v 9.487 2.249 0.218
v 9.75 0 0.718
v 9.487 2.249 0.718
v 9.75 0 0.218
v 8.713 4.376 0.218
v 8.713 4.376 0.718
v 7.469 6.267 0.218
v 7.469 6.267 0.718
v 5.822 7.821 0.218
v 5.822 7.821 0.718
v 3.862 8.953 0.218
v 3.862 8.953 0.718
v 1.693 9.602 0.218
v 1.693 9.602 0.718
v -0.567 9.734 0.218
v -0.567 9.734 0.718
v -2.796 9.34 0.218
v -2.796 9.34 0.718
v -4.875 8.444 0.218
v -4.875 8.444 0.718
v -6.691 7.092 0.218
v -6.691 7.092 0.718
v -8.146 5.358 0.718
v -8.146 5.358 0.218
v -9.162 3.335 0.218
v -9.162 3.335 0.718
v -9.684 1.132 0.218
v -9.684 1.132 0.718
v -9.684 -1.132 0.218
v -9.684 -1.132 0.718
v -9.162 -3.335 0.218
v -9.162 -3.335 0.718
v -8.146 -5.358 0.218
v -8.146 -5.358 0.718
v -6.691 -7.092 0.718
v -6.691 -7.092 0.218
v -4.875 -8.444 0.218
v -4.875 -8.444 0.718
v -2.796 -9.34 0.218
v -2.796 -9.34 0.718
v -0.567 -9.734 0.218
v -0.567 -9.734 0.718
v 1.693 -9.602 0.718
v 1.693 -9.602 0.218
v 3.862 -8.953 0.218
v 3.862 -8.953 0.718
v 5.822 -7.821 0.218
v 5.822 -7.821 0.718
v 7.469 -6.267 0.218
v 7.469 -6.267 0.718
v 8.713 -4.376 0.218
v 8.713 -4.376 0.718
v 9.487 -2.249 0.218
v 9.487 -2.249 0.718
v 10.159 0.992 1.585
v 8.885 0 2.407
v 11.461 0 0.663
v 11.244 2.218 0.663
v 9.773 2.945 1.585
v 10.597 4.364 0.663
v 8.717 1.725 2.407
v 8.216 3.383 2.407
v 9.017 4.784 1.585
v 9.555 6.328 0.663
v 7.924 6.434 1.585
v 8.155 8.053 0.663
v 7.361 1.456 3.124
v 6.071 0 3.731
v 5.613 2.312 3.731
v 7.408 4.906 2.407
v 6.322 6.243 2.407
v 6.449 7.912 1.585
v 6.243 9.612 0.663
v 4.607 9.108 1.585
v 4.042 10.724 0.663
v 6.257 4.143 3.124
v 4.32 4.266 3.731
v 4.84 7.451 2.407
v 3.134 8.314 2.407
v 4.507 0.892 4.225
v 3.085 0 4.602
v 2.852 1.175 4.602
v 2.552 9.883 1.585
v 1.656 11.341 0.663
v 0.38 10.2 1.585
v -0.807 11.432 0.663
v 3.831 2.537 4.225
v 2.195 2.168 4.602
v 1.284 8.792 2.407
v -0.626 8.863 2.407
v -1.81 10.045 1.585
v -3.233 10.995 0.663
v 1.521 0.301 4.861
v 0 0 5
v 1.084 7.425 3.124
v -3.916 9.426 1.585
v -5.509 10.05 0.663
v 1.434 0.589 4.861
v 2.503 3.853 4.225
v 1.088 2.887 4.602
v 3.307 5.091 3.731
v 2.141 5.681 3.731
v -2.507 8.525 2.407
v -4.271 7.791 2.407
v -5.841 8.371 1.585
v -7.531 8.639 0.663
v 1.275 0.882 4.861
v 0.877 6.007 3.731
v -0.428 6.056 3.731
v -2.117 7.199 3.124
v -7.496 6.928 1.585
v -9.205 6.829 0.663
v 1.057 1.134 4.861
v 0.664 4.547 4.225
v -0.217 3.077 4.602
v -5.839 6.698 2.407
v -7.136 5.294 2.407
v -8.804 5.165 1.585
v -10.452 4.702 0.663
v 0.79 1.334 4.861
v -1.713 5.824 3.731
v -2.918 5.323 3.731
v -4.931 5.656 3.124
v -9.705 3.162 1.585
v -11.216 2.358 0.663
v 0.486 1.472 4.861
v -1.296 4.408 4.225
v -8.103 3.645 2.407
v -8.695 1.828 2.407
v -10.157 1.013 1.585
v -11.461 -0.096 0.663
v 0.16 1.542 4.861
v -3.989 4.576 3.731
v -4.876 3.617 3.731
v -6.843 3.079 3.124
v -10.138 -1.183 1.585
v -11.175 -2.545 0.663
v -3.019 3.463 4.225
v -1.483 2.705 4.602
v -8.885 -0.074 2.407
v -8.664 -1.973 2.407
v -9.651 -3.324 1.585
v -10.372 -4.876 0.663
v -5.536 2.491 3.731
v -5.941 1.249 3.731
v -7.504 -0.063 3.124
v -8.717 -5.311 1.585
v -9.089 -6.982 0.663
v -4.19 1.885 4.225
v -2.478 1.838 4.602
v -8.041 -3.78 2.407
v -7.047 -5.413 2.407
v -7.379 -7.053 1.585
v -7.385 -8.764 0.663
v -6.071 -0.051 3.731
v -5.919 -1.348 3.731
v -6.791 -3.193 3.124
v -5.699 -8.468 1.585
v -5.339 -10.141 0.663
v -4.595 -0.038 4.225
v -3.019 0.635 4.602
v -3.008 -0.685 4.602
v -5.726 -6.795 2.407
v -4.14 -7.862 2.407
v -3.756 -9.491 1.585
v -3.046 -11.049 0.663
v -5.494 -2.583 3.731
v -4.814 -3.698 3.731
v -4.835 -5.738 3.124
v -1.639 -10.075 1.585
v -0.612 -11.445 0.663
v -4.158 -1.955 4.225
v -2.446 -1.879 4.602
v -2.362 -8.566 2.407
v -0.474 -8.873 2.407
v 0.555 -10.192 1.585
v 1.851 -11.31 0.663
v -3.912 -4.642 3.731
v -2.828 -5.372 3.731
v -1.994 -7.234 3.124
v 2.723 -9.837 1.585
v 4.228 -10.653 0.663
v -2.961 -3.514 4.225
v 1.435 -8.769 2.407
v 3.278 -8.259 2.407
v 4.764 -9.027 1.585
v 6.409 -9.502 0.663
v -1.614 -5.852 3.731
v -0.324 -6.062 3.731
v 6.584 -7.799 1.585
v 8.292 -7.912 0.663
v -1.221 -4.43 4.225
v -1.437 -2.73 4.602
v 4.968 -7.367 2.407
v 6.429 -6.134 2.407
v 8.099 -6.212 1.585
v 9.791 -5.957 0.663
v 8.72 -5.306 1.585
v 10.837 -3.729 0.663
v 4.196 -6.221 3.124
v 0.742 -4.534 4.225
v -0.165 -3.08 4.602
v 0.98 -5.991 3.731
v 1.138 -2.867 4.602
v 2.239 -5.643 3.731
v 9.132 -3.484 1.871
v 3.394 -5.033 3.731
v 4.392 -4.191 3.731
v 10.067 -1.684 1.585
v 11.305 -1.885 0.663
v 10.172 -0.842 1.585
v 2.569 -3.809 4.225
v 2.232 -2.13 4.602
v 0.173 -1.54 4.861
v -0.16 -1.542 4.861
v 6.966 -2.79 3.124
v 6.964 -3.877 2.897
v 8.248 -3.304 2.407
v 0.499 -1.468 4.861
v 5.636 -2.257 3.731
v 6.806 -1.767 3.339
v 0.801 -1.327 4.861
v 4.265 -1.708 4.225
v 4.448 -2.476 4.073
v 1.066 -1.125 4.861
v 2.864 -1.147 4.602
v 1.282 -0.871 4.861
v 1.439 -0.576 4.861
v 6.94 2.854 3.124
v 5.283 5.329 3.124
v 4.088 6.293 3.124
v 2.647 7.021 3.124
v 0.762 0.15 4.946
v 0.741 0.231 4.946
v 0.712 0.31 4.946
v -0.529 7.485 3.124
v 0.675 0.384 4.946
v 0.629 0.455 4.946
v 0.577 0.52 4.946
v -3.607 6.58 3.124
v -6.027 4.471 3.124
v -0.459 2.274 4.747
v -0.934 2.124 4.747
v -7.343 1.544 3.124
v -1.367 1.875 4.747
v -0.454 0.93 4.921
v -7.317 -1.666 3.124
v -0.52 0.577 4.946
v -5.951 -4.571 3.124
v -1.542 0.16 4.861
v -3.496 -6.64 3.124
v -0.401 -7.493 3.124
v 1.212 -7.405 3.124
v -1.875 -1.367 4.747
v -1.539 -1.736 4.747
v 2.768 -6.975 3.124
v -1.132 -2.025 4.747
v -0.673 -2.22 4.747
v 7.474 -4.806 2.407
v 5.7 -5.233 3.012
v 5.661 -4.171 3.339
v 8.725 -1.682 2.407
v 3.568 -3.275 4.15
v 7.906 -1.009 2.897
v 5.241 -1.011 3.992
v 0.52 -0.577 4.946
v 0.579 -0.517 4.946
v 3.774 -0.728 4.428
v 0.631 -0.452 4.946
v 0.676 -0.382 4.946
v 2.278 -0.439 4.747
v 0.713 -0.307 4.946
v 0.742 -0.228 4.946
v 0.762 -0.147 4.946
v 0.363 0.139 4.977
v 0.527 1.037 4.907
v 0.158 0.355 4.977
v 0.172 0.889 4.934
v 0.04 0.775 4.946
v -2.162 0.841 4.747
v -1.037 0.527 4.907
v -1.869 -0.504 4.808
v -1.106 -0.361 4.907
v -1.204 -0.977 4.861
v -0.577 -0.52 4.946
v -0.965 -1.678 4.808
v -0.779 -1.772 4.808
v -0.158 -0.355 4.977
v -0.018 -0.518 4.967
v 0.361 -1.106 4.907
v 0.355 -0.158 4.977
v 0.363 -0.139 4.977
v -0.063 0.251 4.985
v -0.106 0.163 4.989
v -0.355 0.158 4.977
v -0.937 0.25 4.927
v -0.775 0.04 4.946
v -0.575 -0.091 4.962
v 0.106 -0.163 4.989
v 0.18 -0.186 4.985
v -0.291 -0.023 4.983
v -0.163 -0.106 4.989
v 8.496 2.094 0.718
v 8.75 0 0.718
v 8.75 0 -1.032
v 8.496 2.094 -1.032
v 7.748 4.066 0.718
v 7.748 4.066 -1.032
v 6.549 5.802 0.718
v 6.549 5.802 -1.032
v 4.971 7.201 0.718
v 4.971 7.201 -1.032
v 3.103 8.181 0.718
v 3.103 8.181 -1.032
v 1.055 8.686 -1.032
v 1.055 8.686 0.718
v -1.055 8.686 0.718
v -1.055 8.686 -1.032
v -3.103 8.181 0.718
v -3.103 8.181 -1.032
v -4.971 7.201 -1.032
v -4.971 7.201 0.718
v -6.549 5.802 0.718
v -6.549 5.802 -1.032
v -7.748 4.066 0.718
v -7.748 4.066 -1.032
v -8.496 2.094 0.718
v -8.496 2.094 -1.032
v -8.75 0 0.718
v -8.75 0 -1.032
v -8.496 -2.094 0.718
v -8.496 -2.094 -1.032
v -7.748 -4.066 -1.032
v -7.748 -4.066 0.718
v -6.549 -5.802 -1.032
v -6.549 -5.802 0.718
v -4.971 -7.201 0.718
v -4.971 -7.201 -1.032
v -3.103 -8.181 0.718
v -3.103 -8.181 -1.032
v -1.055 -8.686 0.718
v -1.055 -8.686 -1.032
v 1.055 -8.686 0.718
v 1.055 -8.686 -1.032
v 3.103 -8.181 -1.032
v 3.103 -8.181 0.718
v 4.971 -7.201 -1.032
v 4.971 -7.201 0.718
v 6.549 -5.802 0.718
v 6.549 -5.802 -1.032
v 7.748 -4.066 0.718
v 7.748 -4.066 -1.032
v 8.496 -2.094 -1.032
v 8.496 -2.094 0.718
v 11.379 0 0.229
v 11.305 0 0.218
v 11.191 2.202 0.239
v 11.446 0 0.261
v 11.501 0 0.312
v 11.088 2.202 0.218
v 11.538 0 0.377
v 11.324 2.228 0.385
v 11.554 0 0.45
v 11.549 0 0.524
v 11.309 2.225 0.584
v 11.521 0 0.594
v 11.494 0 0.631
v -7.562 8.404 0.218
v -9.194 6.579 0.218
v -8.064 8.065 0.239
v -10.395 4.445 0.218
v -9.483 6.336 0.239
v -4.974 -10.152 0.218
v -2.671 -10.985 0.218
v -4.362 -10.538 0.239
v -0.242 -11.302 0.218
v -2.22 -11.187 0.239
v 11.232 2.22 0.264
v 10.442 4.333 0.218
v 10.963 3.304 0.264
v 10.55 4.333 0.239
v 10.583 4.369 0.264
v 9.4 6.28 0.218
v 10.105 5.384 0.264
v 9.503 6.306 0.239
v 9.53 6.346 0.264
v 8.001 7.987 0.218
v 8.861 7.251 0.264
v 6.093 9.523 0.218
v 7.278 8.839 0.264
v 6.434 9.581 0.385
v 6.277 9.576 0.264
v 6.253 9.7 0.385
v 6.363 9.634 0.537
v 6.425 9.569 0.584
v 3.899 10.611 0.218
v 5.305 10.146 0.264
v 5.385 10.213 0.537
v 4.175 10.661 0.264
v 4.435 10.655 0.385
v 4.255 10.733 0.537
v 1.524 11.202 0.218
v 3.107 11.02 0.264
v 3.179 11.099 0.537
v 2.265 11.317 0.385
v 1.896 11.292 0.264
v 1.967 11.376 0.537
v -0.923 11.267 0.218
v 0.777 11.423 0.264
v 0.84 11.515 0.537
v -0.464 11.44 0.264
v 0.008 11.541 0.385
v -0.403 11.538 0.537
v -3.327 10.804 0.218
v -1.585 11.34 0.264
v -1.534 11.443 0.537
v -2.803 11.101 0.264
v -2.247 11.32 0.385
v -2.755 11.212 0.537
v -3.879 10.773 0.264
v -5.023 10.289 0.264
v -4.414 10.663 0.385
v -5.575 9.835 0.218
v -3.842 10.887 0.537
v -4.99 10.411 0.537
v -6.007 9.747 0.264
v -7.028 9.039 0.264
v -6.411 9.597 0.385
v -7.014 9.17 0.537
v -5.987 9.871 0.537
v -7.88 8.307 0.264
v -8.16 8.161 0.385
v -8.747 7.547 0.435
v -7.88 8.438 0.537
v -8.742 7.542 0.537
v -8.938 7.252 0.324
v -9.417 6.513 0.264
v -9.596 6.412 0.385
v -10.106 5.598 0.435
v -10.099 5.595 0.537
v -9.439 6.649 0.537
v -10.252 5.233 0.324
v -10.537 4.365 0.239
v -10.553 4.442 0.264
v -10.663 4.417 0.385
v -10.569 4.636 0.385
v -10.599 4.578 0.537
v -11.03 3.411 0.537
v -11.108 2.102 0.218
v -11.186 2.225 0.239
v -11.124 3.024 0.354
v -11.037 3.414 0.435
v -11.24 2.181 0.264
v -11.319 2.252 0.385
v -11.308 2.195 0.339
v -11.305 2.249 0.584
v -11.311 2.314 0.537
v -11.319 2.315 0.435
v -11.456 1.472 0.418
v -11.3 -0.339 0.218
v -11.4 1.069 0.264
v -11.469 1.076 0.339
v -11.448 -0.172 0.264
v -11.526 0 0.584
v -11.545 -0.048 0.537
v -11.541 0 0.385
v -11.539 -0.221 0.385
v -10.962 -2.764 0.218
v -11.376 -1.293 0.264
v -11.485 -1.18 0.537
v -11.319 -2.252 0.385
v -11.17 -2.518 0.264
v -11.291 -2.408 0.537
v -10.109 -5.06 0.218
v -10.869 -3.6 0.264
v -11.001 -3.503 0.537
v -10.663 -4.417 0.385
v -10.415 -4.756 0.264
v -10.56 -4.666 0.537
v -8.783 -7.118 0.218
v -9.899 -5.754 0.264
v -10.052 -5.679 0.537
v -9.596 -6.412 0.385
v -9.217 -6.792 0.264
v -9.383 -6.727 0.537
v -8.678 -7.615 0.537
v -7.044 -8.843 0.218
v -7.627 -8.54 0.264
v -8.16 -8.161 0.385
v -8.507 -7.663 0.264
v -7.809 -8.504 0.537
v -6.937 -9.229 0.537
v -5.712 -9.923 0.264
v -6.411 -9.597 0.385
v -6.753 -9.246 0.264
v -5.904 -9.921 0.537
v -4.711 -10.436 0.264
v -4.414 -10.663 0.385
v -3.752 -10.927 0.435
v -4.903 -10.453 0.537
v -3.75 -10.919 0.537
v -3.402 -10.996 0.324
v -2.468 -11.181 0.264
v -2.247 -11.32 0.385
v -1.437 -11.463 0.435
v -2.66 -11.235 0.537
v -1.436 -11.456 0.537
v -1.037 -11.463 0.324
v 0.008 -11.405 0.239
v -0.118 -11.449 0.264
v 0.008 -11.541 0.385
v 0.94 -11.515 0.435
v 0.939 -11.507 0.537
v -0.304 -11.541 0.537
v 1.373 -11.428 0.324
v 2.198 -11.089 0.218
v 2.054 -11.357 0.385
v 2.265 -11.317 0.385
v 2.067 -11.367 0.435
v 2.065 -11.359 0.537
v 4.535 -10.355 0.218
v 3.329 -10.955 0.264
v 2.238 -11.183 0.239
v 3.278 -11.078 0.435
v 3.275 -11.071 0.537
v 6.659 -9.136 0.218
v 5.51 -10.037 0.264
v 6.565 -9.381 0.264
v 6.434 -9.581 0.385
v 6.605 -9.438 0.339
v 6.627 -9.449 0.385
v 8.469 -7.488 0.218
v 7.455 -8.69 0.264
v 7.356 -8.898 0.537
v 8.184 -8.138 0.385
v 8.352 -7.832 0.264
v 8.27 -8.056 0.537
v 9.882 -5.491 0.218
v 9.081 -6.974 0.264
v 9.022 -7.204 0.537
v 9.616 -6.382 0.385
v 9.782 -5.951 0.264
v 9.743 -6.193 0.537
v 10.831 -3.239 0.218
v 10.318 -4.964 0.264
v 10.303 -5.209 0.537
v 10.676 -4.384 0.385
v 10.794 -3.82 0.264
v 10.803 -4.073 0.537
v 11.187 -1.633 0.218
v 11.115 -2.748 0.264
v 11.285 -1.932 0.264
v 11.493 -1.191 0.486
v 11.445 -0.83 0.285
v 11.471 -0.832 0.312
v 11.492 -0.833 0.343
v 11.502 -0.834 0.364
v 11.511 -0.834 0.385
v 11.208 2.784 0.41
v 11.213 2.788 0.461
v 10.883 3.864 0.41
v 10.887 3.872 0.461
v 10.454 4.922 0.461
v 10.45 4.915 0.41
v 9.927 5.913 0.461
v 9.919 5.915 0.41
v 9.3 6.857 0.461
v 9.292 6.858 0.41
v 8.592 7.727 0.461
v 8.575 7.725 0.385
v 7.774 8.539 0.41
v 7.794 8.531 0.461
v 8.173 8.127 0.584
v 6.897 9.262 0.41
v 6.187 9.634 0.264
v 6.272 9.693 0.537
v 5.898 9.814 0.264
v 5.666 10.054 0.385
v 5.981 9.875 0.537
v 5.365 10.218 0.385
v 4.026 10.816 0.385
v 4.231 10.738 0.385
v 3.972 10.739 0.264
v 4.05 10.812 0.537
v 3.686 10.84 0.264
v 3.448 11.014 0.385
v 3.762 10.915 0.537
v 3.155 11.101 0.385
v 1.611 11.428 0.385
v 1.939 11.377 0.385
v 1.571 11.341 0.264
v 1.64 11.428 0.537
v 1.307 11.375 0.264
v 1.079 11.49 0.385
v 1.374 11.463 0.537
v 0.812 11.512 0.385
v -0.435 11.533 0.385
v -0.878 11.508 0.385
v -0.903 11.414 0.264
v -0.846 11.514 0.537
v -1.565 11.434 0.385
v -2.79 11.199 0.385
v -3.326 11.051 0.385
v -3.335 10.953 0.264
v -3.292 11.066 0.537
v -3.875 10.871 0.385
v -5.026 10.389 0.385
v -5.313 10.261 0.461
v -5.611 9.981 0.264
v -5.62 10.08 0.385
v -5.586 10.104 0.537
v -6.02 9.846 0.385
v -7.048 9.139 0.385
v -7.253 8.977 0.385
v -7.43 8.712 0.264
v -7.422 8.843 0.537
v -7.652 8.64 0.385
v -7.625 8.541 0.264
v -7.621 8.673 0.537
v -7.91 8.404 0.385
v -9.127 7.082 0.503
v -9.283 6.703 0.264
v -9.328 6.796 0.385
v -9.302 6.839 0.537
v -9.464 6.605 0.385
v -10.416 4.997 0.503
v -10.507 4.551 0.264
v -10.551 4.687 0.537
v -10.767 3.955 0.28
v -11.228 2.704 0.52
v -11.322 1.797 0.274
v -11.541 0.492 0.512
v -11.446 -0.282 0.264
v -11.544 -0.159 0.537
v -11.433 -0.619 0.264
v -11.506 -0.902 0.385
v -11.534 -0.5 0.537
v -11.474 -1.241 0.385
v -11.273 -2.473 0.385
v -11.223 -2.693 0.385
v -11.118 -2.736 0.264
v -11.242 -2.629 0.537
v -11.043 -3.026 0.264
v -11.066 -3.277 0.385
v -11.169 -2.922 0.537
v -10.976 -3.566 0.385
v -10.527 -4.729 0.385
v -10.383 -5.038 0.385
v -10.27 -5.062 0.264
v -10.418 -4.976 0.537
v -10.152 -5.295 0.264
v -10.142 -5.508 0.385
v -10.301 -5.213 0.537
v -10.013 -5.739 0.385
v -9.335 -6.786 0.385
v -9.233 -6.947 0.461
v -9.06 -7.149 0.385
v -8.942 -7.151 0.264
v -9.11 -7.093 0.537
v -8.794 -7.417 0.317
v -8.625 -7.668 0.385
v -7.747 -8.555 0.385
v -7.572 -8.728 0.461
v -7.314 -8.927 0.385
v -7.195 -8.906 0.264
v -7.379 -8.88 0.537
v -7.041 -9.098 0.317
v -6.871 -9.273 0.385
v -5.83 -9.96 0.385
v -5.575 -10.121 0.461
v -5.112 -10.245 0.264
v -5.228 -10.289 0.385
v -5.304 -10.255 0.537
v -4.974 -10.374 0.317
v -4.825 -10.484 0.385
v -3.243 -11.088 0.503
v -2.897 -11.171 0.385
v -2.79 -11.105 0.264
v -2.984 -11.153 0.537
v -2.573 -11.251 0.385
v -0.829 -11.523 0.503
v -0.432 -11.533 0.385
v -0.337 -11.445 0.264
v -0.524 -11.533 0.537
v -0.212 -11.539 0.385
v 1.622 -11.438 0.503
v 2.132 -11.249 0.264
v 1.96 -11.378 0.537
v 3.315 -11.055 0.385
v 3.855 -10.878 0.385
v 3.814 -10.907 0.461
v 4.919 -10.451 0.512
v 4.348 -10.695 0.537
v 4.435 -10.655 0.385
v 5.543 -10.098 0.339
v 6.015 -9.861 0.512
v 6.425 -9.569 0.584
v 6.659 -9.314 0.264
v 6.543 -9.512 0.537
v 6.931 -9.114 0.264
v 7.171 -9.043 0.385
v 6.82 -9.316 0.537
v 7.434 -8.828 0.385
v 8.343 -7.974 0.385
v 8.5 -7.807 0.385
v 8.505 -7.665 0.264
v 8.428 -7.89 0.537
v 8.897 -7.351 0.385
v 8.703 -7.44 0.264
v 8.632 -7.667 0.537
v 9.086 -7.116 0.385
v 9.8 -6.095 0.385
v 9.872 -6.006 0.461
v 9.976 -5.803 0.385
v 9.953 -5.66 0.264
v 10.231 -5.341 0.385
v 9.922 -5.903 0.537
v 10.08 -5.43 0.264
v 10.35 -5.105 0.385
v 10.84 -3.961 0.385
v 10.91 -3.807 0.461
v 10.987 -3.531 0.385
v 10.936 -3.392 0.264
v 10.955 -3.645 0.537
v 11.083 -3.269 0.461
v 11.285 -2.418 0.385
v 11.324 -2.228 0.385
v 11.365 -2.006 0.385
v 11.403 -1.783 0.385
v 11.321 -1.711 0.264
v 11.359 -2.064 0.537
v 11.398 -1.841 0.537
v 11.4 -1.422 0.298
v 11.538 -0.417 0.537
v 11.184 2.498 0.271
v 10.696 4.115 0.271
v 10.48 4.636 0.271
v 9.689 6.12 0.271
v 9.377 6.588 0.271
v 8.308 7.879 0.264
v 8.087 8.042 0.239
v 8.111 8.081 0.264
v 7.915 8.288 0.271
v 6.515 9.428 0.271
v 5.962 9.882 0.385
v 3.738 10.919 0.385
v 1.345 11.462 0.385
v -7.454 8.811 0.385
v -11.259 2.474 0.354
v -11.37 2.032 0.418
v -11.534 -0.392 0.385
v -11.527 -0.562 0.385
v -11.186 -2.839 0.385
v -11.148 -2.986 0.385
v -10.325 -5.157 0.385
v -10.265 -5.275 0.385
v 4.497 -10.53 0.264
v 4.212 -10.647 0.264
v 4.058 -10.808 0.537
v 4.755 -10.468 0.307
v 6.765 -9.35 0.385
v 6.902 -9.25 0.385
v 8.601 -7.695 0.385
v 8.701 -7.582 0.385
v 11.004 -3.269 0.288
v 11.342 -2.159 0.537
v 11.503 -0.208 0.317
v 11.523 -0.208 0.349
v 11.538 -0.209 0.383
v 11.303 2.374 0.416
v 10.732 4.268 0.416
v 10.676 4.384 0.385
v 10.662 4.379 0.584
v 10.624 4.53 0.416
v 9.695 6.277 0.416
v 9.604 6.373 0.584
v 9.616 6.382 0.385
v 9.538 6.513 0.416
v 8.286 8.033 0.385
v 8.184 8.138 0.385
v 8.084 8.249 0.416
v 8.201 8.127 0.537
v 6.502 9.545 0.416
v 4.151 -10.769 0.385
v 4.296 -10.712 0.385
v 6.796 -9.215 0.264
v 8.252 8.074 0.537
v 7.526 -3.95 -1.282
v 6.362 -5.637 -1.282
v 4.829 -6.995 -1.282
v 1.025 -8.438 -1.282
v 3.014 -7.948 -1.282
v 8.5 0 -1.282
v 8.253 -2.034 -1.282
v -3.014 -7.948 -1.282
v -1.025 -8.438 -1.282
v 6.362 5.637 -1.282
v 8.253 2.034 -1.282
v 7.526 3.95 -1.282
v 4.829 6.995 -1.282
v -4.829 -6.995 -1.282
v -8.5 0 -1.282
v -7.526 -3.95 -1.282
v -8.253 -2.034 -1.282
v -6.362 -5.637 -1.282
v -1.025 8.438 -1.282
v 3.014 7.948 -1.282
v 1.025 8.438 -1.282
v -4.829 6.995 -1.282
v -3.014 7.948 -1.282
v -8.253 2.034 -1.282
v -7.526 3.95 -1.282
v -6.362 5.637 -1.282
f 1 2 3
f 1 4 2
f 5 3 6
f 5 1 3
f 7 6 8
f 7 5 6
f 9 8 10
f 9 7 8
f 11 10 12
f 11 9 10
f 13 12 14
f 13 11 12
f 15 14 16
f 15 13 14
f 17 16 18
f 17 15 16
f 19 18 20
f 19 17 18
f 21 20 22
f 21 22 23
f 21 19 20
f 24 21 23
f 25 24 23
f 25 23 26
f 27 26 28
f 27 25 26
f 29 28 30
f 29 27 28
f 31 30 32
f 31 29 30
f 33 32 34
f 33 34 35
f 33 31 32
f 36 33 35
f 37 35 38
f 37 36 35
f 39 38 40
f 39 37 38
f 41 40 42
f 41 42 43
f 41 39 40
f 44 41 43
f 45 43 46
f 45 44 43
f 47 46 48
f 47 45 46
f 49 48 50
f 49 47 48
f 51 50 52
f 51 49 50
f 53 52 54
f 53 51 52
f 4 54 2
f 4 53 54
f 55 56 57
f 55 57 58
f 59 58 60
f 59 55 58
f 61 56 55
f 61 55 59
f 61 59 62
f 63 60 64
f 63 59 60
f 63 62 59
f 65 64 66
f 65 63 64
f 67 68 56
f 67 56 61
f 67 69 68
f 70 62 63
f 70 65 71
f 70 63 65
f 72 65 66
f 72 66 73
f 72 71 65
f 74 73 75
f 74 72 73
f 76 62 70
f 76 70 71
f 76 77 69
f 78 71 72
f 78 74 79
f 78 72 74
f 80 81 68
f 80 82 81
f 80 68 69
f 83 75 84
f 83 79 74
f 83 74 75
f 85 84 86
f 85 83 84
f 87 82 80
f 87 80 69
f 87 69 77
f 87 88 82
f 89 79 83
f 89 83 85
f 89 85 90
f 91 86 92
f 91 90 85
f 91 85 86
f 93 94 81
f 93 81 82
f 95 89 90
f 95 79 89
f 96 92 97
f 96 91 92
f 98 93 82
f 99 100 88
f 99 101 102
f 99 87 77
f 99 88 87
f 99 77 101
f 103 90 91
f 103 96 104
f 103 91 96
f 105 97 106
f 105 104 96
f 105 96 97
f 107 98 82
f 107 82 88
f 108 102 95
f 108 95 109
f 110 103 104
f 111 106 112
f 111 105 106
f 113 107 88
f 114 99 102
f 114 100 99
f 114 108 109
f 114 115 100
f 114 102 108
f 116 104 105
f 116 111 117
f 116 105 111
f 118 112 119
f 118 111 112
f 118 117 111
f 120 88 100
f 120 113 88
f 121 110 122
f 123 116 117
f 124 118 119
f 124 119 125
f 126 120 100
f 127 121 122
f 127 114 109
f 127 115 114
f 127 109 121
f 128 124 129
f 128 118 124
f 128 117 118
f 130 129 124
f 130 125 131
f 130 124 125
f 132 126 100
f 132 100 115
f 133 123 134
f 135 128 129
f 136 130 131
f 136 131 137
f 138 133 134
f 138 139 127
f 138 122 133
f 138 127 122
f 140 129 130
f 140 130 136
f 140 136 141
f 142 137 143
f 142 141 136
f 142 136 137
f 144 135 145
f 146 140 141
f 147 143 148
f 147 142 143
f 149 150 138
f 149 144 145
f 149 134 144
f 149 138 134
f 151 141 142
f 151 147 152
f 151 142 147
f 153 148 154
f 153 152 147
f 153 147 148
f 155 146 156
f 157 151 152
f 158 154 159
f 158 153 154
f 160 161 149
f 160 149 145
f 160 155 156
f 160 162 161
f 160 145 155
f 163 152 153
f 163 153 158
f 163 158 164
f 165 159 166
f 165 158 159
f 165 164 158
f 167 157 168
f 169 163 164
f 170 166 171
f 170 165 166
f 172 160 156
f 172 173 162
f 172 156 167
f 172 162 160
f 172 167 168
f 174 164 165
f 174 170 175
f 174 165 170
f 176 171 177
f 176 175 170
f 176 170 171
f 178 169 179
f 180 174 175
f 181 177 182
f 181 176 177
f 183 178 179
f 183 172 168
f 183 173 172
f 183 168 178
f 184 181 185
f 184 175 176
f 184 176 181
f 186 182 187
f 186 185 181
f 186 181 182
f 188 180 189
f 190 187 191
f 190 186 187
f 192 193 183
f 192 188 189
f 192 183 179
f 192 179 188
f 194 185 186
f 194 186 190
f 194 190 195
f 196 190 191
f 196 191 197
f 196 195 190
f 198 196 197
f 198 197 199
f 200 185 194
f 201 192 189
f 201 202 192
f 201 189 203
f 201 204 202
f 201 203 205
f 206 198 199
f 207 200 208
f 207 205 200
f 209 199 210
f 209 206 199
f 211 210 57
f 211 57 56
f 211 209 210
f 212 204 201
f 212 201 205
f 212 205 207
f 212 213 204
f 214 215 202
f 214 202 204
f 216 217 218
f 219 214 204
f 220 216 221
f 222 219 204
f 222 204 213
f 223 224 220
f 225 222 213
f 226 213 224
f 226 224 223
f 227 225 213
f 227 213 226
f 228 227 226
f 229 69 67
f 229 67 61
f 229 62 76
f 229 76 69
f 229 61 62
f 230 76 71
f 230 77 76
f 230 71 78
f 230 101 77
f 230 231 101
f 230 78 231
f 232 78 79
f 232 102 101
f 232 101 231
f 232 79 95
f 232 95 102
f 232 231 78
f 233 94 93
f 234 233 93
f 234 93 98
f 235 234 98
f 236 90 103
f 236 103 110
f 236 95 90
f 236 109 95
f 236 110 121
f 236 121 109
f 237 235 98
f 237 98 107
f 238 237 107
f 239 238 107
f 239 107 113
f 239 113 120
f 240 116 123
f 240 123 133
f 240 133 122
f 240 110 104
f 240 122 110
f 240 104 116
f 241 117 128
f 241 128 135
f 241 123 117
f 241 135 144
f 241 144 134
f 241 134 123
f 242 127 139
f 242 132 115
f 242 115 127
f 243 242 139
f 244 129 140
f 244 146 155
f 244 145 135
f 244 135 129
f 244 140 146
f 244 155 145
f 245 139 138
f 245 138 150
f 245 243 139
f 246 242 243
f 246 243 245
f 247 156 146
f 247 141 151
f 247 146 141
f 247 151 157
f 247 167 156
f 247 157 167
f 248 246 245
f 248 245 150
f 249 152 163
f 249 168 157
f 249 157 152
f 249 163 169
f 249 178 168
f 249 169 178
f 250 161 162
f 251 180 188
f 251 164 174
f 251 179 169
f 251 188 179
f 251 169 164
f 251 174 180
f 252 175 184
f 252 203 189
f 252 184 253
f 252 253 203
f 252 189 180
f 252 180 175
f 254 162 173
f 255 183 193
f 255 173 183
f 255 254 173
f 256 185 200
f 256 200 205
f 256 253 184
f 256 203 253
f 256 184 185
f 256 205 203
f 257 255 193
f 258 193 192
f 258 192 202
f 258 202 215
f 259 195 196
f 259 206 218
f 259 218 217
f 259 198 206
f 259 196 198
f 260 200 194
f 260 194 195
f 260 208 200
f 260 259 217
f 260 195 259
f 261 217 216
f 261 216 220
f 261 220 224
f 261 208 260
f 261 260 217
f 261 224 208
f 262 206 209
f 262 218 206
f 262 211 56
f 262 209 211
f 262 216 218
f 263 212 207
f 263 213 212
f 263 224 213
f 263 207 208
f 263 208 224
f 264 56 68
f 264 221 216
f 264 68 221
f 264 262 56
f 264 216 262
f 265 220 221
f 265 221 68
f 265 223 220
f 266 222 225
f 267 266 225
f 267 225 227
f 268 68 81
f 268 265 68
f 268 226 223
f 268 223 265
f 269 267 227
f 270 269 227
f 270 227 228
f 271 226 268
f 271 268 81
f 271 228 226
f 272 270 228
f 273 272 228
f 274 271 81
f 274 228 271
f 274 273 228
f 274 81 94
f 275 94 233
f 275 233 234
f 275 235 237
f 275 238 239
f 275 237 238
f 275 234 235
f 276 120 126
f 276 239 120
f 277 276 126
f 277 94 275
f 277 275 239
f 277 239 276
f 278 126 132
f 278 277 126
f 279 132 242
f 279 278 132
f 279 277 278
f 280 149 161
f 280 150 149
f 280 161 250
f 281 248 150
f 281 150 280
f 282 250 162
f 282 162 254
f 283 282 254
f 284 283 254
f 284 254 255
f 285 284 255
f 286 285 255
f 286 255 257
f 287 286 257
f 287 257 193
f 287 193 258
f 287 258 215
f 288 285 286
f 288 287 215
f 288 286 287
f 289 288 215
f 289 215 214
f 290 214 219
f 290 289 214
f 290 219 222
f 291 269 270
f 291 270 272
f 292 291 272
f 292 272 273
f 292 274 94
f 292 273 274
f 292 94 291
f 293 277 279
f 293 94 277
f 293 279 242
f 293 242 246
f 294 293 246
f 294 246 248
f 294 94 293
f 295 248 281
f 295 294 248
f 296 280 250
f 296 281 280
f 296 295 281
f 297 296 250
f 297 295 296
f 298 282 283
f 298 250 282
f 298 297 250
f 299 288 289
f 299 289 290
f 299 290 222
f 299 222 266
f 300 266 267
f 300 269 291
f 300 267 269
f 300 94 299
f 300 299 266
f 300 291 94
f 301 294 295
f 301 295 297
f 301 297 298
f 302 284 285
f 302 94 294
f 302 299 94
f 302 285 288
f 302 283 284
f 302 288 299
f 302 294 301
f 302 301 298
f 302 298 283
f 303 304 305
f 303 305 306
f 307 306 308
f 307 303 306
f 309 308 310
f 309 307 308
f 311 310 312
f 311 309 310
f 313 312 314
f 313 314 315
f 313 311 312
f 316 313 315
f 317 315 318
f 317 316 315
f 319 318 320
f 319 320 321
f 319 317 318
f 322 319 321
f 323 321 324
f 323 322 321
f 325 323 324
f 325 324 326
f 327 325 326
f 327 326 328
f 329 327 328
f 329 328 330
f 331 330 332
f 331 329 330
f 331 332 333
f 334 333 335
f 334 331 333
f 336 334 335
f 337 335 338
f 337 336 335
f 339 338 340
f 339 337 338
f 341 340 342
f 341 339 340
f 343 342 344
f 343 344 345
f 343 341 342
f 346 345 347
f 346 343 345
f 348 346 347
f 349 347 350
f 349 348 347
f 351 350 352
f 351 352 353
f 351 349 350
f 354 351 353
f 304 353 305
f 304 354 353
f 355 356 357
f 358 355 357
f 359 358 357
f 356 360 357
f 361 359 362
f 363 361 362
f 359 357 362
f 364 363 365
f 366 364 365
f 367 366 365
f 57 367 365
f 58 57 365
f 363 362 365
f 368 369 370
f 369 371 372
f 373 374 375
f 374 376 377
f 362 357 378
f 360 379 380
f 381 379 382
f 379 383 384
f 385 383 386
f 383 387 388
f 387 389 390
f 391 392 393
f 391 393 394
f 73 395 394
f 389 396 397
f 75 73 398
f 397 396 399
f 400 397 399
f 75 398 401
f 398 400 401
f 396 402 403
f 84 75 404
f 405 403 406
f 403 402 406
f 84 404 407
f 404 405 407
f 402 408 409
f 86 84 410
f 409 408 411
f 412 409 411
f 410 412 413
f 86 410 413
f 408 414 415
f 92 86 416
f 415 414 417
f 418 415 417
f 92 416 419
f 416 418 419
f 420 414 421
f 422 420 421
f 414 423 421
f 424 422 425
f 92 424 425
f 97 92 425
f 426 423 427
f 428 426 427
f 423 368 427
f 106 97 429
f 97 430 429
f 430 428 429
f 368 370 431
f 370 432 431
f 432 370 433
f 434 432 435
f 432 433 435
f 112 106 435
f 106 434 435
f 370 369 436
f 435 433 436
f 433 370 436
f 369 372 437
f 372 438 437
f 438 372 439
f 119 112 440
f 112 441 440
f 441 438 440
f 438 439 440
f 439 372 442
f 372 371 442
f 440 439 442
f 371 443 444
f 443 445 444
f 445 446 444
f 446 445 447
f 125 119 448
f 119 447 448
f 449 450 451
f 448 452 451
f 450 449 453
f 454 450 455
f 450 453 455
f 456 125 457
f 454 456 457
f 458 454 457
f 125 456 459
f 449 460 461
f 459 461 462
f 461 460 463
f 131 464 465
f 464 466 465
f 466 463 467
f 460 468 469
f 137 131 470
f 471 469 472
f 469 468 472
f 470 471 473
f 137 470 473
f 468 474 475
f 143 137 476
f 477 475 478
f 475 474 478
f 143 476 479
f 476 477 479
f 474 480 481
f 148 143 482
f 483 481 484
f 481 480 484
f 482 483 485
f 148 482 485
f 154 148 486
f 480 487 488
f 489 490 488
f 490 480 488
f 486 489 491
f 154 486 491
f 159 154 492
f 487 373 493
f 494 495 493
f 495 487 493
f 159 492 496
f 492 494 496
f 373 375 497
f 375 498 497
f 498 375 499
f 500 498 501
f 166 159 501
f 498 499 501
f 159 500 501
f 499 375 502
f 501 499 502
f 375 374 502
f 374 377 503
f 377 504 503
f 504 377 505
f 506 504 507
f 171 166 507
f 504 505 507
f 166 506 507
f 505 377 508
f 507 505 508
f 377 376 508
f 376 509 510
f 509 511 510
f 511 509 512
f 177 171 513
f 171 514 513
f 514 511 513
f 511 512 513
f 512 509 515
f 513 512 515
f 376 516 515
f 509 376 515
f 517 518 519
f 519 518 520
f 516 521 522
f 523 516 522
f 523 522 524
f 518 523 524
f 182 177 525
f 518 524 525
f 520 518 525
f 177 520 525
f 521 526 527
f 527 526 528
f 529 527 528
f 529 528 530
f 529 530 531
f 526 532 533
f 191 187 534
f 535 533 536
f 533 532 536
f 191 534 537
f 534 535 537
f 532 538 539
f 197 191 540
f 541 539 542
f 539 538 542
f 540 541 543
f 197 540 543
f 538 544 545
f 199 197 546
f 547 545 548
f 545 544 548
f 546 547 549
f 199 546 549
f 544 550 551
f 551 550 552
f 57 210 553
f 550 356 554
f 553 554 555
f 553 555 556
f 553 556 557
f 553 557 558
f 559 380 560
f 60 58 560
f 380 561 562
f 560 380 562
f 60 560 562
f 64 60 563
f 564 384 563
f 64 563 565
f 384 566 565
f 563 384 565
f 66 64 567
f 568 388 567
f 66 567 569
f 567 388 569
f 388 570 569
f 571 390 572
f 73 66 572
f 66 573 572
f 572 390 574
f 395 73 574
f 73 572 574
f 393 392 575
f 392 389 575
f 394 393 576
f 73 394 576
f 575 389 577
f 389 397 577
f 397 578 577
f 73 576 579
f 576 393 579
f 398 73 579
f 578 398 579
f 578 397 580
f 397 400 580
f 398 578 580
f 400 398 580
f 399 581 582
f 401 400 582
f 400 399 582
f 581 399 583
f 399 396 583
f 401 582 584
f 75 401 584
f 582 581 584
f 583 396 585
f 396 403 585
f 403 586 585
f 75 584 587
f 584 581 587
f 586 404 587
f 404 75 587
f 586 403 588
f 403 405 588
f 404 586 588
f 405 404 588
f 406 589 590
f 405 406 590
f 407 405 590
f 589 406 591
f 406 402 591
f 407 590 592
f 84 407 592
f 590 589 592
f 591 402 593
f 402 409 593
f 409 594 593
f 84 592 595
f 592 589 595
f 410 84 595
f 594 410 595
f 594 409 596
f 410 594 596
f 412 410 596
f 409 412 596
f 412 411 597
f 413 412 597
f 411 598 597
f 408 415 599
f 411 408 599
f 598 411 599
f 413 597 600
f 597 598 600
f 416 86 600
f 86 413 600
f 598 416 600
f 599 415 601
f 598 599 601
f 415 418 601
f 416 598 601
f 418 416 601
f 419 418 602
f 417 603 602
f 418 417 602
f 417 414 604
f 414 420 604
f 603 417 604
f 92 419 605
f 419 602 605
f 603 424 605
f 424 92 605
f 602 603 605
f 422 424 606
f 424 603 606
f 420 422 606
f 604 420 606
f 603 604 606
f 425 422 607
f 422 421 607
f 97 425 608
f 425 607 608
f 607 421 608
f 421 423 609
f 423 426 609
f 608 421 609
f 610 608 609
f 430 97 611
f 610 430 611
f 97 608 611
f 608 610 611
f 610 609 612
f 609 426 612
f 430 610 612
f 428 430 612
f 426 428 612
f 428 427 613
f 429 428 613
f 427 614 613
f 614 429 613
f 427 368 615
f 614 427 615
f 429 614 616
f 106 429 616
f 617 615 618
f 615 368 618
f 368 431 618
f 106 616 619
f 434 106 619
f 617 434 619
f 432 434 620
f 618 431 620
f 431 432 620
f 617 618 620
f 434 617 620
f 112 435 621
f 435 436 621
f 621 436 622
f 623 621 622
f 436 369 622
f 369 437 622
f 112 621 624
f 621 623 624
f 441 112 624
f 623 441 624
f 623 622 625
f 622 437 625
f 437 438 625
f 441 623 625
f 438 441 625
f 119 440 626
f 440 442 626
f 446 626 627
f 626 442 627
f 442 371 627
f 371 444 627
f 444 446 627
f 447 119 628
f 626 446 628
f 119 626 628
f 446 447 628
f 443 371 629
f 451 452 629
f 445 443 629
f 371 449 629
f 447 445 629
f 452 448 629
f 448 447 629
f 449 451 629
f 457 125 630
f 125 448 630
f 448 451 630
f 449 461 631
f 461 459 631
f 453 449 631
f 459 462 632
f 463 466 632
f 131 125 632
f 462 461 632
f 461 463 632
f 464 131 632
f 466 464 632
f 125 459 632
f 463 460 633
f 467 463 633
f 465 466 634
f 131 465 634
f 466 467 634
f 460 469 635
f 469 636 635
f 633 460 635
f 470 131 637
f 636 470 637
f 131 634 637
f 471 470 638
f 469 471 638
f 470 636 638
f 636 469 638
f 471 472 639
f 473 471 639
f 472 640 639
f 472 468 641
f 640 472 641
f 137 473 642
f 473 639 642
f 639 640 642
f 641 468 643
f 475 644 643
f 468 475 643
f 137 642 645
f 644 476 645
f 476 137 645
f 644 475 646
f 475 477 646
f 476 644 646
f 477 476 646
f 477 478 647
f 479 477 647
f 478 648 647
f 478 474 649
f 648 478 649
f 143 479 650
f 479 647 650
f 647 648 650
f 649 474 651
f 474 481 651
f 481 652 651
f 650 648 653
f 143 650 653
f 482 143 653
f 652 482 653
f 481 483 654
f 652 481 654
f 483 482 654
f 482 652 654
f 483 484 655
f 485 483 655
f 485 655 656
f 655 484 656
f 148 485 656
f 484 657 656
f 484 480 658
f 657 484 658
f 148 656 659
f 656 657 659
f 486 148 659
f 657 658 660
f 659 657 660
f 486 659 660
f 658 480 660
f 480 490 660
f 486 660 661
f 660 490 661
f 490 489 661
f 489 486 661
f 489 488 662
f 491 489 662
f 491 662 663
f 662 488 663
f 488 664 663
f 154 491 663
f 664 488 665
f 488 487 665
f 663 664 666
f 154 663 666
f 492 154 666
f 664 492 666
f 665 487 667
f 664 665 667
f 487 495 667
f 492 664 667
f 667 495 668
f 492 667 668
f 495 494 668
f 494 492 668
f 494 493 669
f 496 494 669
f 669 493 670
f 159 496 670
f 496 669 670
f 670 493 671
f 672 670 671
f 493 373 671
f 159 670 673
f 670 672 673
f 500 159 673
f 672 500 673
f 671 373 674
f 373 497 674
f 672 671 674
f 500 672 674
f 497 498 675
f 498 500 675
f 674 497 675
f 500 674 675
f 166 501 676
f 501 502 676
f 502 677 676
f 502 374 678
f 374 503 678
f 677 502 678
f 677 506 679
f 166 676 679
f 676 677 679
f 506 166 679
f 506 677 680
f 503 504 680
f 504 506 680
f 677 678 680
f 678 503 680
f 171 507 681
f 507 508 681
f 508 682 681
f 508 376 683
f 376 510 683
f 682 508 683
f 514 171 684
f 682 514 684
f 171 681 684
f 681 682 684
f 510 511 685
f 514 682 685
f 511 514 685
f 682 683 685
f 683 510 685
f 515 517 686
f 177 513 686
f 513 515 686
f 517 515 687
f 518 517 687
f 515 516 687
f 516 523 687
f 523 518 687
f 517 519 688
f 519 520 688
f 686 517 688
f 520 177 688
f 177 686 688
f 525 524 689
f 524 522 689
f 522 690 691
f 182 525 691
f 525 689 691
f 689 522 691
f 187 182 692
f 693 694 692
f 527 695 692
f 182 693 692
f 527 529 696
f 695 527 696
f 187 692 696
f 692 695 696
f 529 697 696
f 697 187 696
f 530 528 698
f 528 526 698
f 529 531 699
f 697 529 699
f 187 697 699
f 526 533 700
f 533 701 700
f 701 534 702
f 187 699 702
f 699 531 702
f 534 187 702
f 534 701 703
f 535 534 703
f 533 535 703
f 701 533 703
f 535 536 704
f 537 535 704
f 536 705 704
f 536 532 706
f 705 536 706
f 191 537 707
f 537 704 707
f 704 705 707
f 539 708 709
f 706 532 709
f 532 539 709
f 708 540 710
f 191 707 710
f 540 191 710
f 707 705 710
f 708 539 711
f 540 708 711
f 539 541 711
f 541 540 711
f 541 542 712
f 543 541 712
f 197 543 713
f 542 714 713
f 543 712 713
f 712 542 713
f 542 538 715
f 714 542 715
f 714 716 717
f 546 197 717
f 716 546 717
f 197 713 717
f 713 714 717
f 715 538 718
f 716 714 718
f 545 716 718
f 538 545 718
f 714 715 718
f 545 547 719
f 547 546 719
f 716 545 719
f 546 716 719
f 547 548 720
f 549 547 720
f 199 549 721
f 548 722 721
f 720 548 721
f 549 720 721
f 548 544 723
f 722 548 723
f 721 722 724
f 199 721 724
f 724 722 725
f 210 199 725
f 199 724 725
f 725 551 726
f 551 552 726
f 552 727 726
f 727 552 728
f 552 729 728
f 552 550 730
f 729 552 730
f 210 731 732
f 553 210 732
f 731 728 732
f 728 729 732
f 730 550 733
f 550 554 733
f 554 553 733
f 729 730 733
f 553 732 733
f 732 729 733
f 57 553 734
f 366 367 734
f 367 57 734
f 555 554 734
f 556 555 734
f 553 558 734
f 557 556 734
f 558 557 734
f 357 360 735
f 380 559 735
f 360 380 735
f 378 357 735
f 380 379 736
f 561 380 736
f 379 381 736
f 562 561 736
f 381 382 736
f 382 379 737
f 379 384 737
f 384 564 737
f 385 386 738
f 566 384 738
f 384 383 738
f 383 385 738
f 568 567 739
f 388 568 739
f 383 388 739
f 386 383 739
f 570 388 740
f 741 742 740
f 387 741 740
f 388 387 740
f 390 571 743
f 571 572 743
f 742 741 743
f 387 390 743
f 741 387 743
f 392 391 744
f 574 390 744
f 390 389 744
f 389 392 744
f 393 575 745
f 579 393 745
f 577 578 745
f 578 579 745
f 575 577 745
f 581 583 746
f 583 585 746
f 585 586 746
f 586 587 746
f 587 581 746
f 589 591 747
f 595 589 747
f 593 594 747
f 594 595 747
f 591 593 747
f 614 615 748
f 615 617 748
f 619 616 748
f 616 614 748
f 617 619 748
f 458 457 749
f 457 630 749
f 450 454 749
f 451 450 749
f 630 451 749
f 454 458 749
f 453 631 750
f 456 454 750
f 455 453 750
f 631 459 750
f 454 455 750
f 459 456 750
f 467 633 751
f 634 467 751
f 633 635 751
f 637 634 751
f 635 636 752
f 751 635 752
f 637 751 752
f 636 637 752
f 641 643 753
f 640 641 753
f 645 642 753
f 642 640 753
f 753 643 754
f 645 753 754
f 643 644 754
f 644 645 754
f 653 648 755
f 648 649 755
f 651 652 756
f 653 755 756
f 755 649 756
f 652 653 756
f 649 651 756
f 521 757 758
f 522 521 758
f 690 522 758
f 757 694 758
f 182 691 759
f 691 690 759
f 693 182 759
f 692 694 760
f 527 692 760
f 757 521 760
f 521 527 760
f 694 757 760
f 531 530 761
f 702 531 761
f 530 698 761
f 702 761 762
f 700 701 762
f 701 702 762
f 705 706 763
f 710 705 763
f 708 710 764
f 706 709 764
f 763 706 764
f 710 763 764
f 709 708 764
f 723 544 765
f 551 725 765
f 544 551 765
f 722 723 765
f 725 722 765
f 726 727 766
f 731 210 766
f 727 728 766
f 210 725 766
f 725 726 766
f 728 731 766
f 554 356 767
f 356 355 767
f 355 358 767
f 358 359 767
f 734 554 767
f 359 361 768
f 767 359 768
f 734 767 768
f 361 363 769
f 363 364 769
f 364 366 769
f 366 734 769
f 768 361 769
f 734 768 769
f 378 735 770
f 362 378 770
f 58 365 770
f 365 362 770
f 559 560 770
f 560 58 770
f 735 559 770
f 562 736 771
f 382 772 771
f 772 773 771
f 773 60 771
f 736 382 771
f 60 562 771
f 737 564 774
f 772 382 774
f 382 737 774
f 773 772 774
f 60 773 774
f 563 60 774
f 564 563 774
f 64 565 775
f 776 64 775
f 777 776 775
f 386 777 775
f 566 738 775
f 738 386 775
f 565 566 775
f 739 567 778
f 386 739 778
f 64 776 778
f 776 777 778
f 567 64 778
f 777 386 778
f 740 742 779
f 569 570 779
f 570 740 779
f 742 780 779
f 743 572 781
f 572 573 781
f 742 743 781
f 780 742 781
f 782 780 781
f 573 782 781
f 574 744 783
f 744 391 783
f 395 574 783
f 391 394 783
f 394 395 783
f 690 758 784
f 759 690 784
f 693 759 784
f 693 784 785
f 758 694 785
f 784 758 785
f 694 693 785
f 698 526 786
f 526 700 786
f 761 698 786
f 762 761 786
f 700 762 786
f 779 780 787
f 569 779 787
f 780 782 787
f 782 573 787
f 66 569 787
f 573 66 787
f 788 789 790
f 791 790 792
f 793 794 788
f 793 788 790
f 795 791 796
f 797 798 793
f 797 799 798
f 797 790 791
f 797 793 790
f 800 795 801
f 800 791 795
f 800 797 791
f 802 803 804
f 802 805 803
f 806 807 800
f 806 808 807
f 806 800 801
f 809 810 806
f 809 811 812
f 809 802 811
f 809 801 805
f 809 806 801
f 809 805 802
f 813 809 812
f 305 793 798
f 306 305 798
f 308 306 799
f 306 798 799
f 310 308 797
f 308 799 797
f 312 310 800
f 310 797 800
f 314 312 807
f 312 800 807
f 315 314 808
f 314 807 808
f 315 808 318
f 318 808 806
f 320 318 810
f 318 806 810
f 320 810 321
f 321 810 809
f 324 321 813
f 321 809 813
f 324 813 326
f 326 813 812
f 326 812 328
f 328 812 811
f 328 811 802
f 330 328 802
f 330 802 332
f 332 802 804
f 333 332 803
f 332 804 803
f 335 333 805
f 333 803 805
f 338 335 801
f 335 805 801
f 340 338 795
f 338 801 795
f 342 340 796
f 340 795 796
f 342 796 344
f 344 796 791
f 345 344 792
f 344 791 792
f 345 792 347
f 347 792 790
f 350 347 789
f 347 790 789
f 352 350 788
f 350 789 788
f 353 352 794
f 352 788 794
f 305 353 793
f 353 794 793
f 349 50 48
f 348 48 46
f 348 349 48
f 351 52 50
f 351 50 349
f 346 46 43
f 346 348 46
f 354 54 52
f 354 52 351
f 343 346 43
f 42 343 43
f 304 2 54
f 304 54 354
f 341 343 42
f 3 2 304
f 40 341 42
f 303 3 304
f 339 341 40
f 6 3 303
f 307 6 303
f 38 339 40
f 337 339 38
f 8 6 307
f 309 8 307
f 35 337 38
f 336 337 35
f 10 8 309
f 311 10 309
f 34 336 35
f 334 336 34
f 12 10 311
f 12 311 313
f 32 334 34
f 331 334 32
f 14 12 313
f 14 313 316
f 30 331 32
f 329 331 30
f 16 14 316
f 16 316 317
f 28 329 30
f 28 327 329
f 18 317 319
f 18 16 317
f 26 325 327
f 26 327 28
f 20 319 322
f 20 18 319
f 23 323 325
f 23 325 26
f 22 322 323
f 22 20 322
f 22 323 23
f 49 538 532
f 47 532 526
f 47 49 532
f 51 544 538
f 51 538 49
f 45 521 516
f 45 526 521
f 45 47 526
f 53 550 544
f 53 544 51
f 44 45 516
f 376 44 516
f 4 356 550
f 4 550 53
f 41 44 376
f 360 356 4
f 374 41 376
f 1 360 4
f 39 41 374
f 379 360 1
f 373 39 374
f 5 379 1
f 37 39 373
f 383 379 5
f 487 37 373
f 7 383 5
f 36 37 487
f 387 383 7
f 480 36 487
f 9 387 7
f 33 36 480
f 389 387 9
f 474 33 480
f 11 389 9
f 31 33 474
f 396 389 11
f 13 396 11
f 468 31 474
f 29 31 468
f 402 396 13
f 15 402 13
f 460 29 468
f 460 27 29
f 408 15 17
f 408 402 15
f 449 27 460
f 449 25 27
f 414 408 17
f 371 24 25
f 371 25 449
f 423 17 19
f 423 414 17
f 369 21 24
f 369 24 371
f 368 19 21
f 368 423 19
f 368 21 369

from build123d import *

# Parameters (mm, degrees)
F2_R    = 0.25
F3_SIZE = 0.25


with BuildPart() as f1:
    # F0 (on Front) → F1 (revolve)
    with BuildSketch(Plane.XZ):
        with BuildLine():
            Line((8.75, -1.282336), (8.75, 0.217664))
            Line((8.75, 0.217664), (8.75, 0.717664))
            Line((8.75, 0.717664), (9.75, 0.717664))
            Line((9.75, 0.717664), (9.75, 0.217664))
            Line((9.75, 0.217664), (12, 0.217664))
            ThreePointArc((12, 0.217664), (6.396738, 3.604341), (0, 5))
            Line((0, 5), (0, -1.282336))
            Line((0, -1.282336), (8.75, -1.282336))
        make_face()
    revolve(axis=Axis((0, 0, 1.858832), (0, 0, 1)))

    # F2
    f2_edges = [f1.edges().sort_by_distance(p)[0] for p in [
        (-12, 0, 0.217664),
    ]]
    fillet(f2_edges, radius=F2_R)

    # F3
    f3_edges = [f1.edges().sort_by_distance(p)[0] for p in [
        (-8.75, 0, -1.282336),
    ]]
    chamfer(f3_edges, length=F3_SIZE)


solid = f1.part
